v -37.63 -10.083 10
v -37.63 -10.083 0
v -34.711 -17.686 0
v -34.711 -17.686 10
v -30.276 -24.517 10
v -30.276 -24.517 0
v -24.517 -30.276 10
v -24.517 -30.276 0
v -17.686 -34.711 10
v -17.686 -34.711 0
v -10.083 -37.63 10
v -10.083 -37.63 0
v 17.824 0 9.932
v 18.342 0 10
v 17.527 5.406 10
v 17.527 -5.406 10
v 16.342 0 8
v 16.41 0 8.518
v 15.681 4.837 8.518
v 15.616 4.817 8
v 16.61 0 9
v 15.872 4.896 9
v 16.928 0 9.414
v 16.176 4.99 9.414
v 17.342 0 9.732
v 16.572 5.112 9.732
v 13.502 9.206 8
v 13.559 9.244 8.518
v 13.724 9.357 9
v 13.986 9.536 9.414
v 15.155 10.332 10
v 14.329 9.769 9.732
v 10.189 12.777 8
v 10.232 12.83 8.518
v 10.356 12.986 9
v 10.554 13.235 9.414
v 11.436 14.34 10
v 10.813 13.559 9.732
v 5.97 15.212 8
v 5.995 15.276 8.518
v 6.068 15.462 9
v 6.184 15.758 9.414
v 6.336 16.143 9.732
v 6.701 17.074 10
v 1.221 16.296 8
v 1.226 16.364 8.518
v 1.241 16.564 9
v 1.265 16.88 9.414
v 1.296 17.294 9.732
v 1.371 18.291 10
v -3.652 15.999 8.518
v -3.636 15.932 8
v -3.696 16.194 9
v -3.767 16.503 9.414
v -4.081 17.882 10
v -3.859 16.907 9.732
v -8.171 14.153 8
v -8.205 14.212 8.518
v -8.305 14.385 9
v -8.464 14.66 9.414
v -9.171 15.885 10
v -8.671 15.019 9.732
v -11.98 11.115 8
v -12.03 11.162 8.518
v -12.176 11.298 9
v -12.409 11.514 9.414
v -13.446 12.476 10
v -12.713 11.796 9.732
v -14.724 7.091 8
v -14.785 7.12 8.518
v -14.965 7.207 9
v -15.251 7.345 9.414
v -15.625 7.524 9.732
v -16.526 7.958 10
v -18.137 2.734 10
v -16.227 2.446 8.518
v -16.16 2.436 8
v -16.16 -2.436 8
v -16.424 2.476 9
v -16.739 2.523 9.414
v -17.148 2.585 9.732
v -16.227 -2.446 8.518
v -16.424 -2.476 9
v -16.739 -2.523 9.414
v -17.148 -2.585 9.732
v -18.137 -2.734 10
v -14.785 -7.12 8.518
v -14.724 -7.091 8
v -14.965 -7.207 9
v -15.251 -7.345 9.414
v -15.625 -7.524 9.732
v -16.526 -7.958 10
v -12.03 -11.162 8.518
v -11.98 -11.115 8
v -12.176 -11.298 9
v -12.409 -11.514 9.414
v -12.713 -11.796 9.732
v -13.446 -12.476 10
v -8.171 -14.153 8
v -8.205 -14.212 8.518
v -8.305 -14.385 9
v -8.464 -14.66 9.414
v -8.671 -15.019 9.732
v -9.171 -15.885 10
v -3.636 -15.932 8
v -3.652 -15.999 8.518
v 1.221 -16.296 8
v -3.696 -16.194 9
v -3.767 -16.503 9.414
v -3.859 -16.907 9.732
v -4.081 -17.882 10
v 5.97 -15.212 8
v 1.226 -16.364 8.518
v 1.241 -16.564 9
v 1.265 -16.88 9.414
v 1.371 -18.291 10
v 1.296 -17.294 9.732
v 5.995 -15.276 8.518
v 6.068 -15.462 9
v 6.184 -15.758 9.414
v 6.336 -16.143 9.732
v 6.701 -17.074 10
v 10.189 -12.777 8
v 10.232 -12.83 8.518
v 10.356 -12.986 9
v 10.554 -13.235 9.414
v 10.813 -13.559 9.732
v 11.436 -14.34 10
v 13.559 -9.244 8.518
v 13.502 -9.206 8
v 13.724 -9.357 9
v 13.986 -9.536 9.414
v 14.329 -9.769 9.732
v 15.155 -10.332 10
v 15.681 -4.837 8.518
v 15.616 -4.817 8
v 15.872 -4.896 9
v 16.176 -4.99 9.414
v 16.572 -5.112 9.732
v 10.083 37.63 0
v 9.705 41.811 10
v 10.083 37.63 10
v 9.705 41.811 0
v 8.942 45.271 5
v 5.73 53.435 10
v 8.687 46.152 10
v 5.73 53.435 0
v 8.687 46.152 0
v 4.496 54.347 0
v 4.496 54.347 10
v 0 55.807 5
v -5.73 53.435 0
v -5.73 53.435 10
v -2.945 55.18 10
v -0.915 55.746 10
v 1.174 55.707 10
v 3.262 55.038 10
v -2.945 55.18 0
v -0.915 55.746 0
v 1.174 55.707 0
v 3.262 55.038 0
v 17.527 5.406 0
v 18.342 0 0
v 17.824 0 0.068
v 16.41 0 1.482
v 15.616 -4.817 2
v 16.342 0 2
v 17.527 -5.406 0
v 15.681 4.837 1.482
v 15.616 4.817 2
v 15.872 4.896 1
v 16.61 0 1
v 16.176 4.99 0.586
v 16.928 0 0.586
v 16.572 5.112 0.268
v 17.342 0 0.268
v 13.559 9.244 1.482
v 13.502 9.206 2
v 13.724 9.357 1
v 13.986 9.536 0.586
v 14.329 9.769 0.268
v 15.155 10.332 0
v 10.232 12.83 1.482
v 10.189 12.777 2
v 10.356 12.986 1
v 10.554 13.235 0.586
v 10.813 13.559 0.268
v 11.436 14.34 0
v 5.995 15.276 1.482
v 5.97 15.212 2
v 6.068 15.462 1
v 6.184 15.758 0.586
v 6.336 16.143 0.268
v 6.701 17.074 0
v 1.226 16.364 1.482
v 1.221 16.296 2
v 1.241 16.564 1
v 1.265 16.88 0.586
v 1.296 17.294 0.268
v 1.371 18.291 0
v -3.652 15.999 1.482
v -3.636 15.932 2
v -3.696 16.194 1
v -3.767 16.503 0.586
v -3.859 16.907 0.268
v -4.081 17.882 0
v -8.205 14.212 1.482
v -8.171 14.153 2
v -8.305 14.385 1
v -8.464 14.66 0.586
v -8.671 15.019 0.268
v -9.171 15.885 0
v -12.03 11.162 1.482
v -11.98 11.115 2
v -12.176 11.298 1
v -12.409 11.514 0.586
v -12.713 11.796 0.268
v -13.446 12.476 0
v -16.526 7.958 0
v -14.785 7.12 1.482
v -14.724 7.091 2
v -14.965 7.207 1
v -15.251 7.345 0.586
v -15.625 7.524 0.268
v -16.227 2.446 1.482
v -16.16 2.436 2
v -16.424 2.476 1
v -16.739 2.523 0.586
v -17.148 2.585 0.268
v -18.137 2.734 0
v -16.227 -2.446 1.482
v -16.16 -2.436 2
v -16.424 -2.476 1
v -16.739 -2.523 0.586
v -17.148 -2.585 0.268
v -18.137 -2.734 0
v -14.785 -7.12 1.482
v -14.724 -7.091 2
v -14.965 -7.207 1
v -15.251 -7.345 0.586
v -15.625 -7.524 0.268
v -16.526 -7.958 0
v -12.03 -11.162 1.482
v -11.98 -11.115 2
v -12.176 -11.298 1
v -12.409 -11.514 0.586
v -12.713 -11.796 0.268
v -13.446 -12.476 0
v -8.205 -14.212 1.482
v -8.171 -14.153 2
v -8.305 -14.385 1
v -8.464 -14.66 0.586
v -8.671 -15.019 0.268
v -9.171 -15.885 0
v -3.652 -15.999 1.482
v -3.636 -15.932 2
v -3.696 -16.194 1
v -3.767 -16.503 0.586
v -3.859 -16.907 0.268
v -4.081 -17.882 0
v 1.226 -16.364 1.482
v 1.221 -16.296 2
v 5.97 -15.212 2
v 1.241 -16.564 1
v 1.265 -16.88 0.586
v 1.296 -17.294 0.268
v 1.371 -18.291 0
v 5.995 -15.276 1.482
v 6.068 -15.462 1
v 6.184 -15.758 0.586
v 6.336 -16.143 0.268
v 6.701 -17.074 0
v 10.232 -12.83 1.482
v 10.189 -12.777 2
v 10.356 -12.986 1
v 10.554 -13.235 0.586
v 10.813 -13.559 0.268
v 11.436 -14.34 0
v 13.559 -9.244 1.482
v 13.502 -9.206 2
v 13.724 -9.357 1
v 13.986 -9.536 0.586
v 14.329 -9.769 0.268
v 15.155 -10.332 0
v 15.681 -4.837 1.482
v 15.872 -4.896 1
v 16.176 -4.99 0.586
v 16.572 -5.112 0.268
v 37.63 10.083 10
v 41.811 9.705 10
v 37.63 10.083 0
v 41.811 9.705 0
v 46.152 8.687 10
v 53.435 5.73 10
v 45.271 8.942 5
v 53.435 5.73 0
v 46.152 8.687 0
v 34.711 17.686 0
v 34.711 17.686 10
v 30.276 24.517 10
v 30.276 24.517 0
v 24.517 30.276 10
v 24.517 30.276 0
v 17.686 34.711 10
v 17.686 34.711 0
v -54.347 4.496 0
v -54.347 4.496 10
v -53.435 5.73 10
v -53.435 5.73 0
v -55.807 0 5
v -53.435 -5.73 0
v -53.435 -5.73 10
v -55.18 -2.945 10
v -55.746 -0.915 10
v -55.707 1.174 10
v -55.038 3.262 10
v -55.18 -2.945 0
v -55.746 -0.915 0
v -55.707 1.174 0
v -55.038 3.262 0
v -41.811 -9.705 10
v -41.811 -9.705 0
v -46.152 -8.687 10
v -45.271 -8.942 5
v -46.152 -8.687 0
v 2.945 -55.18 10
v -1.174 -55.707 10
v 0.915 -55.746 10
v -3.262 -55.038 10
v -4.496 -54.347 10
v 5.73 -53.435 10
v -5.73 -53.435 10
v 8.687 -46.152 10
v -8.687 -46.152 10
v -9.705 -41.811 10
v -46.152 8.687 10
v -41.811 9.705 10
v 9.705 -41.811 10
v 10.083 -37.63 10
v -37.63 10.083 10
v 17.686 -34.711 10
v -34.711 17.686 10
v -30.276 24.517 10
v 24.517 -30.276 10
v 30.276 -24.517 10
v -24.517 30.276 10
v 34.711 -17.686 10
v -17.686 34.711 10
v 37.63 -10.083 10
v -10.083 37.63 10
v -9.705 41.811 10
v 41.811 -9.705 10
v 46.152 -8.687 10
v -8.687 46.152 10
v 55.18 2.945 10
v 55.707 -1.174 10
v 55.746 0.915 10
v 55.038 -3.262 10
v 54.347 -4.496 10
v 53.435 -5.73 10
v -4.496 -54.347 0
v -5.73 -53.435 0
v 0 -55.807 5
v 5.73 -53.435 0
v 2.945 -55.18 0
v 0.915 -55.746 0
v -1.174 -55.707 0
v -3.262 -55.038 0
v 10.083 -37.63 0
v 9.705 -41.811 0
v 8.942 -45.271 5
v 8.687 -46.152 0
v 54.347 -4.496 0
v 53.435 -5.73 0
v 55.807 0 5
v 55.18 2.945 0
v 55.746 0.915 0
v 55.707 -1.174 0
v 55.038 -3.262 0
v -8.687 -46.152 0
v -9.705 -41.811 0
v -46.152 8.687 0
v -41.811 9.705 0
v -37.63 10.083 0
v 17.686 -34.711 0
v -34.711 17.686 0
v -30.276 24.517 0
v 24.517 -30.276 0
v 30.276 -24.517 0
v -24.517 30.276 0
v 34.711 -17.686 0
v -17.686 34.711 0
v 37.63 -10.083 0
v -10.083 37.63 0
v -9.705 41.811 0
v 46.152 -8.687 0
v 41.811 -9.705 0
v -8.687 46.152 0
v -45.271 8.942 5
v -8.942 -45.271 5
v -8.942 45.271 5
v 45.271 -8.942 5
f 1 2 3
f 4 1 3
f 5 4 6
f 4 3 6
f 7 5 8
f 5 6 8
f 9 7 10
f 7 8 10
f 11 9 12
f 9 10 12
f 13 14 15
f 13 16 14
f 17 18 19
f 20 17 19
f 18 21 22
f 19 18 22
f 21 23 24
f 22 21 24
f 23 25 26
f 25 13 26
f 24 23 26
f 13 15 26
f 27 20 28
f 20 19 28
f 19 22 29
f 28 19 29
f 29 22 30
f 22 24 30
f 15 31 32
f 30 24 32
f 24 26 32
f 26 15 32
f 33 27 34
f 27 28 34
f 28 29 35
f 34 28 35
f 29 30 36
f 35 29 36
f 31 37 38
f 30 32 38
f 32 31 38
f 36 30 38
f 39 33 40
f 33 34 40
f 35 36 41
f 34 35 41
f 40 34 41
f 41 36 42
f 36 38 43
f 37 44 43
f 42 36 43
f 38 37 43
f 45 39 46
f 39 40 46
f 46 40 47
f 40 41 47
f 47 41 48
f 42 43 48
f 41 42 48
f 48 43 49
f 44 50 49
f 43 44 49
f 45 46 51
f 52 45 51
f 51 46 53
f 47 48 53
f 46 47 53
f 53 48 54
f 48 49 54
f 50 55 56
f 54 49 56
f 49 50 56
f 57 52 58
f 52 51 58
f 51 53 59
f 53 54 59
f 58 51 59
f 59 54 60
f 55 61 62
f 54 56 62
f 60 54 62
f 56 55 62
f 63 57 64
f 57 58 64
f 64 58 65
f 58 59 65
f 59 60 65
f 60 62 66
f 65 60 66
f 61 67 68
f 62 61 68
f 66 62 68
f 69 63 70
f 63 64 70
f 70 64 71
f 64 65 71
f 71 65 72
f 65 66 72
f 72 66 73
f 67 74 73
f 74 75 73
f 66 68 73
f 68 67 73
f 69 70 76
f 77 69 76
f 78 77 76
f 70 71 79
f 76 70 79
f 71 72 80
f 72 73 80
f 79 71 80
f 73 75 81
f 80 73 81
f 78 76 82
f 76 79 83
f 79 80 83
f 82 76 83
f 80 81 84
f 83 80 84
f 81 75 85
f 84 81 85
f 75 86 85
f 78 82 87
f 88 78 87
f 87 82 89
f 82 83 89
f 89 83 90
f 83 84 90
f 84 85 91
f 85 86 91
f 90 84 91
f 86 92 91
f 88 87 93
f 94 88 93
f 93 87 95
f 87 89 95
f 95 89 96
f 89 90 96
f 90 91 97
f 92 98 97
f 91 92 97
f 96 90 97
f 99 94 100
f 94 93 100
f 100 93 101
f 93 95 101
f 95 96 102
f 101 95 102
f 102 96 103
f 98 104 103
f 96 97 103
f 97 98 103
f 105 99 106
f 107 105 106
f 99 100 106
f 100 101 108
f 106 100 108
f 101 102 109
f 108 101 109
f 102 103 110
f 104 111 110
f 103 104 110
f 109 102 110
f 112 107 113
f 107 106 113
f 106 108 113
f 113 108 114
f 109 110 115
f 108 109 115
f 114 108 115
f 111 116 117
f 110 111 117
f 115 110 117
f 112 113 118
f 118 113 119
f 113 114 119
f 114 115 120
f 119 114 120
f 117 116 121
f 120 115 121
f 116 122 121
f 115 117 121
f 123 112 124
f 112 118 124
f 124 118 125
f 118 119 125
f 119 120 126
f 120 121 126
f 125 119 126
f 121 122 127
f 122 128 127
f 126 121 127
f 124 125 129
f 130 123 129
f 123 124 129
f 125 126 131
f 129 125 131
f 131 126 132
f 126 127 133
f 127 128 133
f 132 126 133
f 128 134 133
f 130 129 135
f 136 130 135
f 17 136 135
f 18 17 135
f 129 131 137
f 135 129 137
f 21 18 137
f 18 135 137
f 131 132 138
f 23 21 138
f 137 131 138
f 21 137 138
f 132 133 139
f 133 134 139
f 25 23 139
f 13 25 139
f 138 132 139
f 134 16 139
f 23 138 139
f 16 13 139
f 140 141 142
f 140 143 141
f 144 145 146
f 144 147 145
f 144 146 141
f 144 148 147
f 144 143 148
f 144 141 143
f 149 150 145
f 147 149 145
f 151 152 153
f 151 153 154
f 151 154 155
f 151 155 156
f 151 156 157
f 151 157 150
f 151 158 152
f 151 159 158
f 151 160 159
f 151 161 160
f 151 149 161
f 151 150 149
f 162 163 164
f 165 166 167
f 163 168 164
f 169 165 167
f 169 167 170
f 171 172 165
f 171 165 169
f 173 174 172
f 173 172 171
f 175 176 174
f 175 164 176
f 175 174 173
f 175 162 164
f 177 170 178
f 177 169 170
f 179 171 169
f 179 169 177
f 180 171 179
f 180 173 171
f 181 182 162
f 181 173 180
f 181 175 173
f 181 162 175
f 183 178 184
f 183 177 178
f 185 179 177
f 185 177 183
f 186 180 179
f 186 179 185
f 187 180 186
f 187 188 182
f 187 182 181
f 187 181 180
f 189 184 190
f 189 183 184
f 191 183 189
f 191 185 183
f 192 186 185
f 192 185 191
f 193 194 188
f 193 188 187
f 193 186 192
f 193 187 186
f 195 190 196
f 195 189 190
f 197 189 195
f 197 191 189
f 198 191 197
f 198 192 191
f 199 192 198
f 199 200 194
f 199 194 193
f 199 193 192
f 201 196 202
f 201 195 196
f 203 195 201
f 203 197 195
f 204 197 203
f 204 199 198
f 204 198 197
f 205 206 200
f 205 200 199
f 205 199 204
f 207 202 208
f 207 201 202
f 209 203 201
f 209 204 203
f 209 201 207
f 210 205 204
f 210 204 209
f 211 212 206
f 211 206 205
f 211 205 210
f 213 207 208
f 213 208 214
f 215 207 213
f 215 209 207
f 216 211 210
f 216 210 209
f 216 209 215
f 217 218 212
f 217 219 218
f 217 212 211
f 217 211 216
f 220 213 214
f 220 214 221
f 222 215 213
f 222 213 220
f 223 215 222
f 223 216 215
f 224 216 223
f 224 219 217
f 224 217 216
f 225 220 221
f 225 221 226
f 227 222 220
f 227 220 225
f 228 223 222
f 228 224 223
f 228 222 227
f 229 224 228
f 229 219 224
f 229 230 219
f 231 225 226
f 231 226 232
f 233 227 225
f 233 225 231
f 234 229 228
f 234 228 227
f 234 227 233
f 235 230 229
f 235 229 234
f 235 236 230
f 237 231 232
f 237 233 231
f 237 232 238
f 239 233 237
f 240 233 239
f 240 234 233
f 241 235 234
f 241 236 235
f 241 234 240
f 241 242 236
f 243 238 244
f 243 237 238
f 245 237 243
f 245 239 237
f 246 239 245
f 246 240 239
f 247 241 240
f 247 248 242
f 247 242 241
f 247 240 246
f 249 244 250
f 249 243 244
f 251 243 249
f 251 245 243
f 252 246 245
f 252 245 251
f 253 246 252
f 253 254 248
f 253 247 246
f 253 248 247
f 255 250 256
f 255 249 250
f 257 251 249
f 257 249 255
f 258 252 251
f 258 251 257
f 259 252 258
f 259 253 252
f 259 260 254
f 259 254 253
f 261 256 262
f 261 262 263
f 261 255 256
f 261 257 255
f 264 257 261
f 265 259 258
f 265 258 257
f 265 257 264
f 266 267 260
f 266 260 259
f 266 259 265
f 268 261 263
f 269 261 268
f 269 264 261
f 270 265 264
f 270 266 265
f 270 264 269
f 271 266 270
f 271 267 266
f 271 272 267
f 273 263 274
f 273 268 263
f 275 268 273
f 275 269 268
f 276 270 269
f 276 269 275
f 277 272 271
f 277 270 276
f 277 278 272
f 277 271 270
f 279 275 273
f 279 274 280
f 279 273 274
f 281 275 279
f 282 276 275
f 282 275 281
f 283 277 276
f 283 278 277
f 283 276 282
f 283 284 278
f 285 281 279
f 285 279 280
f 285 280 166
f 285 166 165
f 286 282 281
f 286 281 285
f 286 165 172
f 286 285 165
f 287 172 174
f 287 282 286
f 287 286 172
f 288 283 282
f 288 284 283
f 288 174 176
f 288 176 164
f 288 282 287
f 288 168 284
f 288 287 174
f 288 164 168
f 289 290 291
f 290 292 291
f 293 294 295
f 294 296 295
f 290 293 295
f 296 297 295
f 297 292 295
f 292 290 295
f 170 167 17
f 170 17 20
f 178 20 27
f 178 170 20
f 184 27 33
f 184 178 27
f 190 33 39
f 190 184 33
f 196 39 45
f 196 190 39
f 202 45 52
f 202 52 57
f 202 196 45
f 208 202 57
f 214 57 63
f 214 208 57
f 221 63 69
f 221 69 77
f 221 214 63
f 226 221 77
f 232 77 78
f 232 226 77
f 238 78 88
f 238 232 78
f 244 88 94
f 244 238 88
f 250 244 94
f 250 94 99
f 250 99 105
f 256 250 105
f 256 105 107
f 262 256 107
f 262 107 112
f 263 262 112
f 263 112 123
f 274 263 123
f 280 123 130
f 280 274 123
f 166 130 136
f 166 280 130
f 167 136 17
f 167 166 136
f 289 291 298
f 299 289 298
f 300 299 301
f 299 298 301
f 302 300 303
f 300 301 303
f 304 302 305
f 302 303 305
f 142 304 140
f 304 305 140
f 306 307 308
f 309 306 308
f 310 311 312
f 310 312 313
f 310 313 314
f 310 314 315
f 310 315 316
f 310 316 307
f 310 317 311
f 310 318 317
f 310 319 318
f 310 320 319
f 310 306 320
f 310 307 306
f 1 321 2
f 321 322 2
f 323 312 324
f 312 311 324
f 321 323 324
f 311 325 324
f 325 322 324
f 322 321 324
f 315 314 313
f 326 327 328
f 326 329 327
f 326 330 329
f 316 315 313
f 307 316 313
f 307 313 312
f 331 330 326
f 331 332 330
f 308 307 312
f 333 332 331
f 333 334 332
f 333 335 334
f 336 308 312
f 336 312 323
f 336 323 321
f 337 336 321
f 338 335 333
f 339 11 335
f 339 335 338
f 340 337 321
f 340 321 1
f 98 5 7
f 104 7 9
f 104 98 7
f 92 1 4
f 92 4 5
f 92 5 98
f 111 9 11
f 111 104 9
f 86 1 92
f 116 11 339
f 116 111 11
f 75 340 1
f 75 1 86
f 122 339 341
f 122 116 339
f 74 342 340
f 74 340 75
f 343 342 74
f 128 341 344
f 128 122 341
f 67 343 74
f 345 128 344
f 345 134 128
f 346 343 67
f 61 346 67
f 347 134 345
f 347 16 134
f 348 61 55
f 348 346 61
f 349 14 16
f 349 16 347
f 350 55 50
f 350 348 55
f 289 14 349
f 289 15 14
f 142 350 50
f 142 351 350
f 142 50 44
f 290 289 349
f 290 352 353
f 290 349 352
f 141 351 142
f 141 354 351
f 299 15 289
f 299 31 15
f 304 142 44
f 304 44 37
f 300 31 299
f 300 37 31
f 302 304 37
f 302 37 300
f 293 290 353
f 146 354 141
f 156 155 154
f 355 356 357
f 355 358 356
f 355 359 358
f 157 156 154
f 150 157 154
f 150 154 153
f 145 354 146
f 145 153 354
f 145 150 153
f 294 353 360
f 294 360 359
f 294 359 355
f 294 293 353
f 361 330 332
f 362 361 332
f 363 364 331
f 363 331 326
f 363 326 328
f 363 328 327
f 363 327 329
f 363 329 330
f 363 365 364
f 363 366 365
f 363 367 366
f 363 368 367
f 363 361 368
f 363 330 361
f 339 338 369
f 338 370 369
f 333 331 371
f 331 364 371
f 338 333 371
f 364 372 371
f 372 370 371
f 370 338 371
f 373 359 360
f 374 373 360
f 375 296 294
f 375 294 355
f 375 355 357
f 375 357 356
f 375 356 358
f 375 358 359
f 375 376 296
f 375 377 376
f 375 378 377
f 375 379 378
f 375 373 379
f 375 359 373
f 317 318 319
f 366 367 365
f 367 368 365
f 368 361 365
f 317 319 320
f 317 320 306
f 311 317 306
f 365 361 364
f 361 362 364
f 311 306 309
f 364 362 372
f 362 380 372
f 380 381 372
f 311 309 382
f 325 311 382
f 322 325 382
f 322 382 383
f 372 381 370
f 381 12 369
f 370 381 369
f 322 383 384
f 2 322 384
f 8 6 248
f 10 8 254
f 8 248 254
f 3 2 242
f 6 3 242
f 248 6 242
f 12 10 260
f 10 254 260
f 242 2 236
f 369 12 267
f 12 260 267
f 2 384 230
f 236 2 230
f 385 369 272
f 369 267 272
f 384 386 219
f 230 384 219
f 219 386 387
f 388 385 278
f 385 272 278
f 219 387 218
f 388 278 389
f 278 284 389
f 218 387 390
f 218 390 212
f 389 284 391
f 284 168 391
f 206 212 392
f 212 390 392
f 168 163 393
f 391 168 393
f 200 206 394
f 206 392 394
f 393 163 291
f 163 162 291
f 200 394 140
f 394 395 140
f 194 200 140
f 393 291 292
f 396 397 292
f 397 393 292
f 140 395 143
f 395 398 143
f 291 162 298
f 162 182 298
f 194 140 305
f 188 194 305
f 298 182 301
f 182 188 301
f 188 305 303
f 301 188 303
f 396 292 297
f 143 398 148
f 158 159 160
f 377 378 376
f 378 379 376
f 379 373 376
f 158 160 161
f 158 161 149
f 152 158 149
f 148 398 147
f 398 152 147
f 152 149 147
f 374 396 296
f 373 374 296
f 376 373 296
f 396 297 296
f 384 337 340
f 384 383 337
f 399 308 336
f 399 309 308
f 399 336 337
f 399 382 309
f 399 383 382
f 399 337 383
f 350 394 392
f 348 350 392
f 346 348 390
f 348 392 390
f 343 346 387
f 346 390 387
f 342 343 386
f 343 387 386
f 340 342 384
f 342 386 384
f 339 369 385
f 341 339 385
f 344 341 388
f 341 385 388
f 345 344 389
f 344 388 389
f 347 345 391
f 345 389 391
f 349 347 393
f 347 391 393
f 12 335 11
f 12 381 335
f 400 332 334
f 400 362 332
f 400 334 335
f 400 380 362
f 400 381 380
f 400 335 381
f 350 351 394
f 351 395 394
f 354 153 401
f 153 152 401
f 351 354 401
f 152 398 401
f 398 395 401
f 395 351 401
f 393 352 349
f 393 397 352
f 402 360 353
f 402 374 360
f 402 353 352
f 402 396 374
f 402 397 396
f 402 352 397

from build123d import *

# Parameters (mm, degrees)
SKETCH1_R           = 16.342033632
BOSS_EXTRUDE1_DEPTH = 10
FILLET1_R           = 2
FILLET2_R           = 2


with BuildPart() as part:
    # Sketch1 → Boss-Extrude1 (new body)
    with BuildSketch(Plane.XY):
        with BuildLine():
            ThreePointArc((-37.630023744, -10.082934473), (-27.54708927, -27.54708927), (-10.082934473, -37.630023744))
            add(Edge.make_bspline(
                [(-5.730379822, -53.435114302), (-9.976997746, -45.009715936), (-10.082934473, -37.630023744)],
                knots=[0, 0, 0, 1, 1, 1], degree=2))
            add(Edge.make_bspline(
                [(5.730379822, -53.435114302), (0, -58.17853574), (-5.730379822, -53.435114302)],
                knots=[0, 0, 0, 1, 1, 1], degree=2))
            add(Edge.make_bspline(
                [(5.730379822, -53.435114302), (9.976997746, -45.009715936), (10.082934473, -37.630023744)],
                knots=[0, 0, 0, 1, 1, 1], degree=2))
            ThreePointArc((10.082934473, -37.630023744), (27.54708927, -27.54708927), (37.630023744, -10.082934473))
            add(Edge.make_bspline(
                [(53.435114302, -5.730379822), (45.009715936, -9.976997746), (37.630023744, -10.082934473)],
                knots=[0, 0, 0, 1, 1, 1], degree=2))
            add(Edge.make_bspline(
                [(53.435114302, 5.730379822), (58.17853574, 0), (53.435114302, -5.730379822)],
                knots=[0, 0, 0, 1, 1, 1], degree=2))
            add(Edge.make_bspline(
                [(53.435114302, 5.730379822), (45.009715936, 9.976997746), (37.630023744, 10.082934473)],
                knots=[0, 0, 0, 1, 1, 1], degree=2))
            ThreePointArc((37.630023744, 10.082934473), (27.54708927, 27.54708927), (10.082934473, 37.630023744))
            add(Edge.make_bspline(
                [(5.730379822, 53.435114302), (9.976997746, 45.009715936), (10.082934473, 37.630023744)],
                knots=[0, 0, 0, 1, 1, 1], degree=2))
            add(Edge.make_bspline(
                [(-5.730379822, 53.435114302), (0, 58.17853574), (5.730379822, 53.435114302)],
                knots=[0, 0, 0, 1, 1, 1], degree=2))
            add(Edge.make_bspline(
                [(-5.730379822, 53.435114302), (-9.976997746, 45.009715936), (-10.082934473, 37.630023744)],
                knots=[0, 0, 0, 1, 1, 1], degree=2))
            ThreePointArc((-10.082934473, 37.630023744), (-27.54708927, 27.54708927), (-37.630023744, 10.082934473))
            add(Edge.make_bspline(
                [(-53.435114302, 5.730379822), (-45.009715936, 9.976997746), (-37.630023744, 10.082934473)],
                knots=[0, 0, 0, 1, 1, 1], degree=2))
            add(Edge.make_bspline(
                [(-53.435114302, -5.730379822), (-58.17853574, 0), (-53.435114302, 5.730379822)],
                knots=[0, 0, 0, 1, 1, 1], degree=2))
            add(Edge.make_bspline(
                [(-53.435114302, -5.730379822), (-45.009715936, -9.976997746), (-37.630023744, -10.082934473)],
                knots=[0, 0, 0, 1, 1, 1], degree=2))
        make_face()
        Circle(SKETCH1_R, mode=Mode.SUBTRACT)
    extrude(amount=BOSS_EXTRUDE1_DEPTH)

    # Fillet1
    fillet1_edges = [part.edges().sort_by_distance(p)[0] for p in [
        (-16.342033632, 0, 0),
    ]]
    fillet(fillet1_edges, radius=FILLET1_R)

    # Fillet2
    fillet2_edges = [part.edges().sort_by_distance(p)[0] for p in [
        (-16.342033632, 0, 10),
    ]]
    fillet(fillet2_edges, radius=FILLET2_R)


solid = part.part
